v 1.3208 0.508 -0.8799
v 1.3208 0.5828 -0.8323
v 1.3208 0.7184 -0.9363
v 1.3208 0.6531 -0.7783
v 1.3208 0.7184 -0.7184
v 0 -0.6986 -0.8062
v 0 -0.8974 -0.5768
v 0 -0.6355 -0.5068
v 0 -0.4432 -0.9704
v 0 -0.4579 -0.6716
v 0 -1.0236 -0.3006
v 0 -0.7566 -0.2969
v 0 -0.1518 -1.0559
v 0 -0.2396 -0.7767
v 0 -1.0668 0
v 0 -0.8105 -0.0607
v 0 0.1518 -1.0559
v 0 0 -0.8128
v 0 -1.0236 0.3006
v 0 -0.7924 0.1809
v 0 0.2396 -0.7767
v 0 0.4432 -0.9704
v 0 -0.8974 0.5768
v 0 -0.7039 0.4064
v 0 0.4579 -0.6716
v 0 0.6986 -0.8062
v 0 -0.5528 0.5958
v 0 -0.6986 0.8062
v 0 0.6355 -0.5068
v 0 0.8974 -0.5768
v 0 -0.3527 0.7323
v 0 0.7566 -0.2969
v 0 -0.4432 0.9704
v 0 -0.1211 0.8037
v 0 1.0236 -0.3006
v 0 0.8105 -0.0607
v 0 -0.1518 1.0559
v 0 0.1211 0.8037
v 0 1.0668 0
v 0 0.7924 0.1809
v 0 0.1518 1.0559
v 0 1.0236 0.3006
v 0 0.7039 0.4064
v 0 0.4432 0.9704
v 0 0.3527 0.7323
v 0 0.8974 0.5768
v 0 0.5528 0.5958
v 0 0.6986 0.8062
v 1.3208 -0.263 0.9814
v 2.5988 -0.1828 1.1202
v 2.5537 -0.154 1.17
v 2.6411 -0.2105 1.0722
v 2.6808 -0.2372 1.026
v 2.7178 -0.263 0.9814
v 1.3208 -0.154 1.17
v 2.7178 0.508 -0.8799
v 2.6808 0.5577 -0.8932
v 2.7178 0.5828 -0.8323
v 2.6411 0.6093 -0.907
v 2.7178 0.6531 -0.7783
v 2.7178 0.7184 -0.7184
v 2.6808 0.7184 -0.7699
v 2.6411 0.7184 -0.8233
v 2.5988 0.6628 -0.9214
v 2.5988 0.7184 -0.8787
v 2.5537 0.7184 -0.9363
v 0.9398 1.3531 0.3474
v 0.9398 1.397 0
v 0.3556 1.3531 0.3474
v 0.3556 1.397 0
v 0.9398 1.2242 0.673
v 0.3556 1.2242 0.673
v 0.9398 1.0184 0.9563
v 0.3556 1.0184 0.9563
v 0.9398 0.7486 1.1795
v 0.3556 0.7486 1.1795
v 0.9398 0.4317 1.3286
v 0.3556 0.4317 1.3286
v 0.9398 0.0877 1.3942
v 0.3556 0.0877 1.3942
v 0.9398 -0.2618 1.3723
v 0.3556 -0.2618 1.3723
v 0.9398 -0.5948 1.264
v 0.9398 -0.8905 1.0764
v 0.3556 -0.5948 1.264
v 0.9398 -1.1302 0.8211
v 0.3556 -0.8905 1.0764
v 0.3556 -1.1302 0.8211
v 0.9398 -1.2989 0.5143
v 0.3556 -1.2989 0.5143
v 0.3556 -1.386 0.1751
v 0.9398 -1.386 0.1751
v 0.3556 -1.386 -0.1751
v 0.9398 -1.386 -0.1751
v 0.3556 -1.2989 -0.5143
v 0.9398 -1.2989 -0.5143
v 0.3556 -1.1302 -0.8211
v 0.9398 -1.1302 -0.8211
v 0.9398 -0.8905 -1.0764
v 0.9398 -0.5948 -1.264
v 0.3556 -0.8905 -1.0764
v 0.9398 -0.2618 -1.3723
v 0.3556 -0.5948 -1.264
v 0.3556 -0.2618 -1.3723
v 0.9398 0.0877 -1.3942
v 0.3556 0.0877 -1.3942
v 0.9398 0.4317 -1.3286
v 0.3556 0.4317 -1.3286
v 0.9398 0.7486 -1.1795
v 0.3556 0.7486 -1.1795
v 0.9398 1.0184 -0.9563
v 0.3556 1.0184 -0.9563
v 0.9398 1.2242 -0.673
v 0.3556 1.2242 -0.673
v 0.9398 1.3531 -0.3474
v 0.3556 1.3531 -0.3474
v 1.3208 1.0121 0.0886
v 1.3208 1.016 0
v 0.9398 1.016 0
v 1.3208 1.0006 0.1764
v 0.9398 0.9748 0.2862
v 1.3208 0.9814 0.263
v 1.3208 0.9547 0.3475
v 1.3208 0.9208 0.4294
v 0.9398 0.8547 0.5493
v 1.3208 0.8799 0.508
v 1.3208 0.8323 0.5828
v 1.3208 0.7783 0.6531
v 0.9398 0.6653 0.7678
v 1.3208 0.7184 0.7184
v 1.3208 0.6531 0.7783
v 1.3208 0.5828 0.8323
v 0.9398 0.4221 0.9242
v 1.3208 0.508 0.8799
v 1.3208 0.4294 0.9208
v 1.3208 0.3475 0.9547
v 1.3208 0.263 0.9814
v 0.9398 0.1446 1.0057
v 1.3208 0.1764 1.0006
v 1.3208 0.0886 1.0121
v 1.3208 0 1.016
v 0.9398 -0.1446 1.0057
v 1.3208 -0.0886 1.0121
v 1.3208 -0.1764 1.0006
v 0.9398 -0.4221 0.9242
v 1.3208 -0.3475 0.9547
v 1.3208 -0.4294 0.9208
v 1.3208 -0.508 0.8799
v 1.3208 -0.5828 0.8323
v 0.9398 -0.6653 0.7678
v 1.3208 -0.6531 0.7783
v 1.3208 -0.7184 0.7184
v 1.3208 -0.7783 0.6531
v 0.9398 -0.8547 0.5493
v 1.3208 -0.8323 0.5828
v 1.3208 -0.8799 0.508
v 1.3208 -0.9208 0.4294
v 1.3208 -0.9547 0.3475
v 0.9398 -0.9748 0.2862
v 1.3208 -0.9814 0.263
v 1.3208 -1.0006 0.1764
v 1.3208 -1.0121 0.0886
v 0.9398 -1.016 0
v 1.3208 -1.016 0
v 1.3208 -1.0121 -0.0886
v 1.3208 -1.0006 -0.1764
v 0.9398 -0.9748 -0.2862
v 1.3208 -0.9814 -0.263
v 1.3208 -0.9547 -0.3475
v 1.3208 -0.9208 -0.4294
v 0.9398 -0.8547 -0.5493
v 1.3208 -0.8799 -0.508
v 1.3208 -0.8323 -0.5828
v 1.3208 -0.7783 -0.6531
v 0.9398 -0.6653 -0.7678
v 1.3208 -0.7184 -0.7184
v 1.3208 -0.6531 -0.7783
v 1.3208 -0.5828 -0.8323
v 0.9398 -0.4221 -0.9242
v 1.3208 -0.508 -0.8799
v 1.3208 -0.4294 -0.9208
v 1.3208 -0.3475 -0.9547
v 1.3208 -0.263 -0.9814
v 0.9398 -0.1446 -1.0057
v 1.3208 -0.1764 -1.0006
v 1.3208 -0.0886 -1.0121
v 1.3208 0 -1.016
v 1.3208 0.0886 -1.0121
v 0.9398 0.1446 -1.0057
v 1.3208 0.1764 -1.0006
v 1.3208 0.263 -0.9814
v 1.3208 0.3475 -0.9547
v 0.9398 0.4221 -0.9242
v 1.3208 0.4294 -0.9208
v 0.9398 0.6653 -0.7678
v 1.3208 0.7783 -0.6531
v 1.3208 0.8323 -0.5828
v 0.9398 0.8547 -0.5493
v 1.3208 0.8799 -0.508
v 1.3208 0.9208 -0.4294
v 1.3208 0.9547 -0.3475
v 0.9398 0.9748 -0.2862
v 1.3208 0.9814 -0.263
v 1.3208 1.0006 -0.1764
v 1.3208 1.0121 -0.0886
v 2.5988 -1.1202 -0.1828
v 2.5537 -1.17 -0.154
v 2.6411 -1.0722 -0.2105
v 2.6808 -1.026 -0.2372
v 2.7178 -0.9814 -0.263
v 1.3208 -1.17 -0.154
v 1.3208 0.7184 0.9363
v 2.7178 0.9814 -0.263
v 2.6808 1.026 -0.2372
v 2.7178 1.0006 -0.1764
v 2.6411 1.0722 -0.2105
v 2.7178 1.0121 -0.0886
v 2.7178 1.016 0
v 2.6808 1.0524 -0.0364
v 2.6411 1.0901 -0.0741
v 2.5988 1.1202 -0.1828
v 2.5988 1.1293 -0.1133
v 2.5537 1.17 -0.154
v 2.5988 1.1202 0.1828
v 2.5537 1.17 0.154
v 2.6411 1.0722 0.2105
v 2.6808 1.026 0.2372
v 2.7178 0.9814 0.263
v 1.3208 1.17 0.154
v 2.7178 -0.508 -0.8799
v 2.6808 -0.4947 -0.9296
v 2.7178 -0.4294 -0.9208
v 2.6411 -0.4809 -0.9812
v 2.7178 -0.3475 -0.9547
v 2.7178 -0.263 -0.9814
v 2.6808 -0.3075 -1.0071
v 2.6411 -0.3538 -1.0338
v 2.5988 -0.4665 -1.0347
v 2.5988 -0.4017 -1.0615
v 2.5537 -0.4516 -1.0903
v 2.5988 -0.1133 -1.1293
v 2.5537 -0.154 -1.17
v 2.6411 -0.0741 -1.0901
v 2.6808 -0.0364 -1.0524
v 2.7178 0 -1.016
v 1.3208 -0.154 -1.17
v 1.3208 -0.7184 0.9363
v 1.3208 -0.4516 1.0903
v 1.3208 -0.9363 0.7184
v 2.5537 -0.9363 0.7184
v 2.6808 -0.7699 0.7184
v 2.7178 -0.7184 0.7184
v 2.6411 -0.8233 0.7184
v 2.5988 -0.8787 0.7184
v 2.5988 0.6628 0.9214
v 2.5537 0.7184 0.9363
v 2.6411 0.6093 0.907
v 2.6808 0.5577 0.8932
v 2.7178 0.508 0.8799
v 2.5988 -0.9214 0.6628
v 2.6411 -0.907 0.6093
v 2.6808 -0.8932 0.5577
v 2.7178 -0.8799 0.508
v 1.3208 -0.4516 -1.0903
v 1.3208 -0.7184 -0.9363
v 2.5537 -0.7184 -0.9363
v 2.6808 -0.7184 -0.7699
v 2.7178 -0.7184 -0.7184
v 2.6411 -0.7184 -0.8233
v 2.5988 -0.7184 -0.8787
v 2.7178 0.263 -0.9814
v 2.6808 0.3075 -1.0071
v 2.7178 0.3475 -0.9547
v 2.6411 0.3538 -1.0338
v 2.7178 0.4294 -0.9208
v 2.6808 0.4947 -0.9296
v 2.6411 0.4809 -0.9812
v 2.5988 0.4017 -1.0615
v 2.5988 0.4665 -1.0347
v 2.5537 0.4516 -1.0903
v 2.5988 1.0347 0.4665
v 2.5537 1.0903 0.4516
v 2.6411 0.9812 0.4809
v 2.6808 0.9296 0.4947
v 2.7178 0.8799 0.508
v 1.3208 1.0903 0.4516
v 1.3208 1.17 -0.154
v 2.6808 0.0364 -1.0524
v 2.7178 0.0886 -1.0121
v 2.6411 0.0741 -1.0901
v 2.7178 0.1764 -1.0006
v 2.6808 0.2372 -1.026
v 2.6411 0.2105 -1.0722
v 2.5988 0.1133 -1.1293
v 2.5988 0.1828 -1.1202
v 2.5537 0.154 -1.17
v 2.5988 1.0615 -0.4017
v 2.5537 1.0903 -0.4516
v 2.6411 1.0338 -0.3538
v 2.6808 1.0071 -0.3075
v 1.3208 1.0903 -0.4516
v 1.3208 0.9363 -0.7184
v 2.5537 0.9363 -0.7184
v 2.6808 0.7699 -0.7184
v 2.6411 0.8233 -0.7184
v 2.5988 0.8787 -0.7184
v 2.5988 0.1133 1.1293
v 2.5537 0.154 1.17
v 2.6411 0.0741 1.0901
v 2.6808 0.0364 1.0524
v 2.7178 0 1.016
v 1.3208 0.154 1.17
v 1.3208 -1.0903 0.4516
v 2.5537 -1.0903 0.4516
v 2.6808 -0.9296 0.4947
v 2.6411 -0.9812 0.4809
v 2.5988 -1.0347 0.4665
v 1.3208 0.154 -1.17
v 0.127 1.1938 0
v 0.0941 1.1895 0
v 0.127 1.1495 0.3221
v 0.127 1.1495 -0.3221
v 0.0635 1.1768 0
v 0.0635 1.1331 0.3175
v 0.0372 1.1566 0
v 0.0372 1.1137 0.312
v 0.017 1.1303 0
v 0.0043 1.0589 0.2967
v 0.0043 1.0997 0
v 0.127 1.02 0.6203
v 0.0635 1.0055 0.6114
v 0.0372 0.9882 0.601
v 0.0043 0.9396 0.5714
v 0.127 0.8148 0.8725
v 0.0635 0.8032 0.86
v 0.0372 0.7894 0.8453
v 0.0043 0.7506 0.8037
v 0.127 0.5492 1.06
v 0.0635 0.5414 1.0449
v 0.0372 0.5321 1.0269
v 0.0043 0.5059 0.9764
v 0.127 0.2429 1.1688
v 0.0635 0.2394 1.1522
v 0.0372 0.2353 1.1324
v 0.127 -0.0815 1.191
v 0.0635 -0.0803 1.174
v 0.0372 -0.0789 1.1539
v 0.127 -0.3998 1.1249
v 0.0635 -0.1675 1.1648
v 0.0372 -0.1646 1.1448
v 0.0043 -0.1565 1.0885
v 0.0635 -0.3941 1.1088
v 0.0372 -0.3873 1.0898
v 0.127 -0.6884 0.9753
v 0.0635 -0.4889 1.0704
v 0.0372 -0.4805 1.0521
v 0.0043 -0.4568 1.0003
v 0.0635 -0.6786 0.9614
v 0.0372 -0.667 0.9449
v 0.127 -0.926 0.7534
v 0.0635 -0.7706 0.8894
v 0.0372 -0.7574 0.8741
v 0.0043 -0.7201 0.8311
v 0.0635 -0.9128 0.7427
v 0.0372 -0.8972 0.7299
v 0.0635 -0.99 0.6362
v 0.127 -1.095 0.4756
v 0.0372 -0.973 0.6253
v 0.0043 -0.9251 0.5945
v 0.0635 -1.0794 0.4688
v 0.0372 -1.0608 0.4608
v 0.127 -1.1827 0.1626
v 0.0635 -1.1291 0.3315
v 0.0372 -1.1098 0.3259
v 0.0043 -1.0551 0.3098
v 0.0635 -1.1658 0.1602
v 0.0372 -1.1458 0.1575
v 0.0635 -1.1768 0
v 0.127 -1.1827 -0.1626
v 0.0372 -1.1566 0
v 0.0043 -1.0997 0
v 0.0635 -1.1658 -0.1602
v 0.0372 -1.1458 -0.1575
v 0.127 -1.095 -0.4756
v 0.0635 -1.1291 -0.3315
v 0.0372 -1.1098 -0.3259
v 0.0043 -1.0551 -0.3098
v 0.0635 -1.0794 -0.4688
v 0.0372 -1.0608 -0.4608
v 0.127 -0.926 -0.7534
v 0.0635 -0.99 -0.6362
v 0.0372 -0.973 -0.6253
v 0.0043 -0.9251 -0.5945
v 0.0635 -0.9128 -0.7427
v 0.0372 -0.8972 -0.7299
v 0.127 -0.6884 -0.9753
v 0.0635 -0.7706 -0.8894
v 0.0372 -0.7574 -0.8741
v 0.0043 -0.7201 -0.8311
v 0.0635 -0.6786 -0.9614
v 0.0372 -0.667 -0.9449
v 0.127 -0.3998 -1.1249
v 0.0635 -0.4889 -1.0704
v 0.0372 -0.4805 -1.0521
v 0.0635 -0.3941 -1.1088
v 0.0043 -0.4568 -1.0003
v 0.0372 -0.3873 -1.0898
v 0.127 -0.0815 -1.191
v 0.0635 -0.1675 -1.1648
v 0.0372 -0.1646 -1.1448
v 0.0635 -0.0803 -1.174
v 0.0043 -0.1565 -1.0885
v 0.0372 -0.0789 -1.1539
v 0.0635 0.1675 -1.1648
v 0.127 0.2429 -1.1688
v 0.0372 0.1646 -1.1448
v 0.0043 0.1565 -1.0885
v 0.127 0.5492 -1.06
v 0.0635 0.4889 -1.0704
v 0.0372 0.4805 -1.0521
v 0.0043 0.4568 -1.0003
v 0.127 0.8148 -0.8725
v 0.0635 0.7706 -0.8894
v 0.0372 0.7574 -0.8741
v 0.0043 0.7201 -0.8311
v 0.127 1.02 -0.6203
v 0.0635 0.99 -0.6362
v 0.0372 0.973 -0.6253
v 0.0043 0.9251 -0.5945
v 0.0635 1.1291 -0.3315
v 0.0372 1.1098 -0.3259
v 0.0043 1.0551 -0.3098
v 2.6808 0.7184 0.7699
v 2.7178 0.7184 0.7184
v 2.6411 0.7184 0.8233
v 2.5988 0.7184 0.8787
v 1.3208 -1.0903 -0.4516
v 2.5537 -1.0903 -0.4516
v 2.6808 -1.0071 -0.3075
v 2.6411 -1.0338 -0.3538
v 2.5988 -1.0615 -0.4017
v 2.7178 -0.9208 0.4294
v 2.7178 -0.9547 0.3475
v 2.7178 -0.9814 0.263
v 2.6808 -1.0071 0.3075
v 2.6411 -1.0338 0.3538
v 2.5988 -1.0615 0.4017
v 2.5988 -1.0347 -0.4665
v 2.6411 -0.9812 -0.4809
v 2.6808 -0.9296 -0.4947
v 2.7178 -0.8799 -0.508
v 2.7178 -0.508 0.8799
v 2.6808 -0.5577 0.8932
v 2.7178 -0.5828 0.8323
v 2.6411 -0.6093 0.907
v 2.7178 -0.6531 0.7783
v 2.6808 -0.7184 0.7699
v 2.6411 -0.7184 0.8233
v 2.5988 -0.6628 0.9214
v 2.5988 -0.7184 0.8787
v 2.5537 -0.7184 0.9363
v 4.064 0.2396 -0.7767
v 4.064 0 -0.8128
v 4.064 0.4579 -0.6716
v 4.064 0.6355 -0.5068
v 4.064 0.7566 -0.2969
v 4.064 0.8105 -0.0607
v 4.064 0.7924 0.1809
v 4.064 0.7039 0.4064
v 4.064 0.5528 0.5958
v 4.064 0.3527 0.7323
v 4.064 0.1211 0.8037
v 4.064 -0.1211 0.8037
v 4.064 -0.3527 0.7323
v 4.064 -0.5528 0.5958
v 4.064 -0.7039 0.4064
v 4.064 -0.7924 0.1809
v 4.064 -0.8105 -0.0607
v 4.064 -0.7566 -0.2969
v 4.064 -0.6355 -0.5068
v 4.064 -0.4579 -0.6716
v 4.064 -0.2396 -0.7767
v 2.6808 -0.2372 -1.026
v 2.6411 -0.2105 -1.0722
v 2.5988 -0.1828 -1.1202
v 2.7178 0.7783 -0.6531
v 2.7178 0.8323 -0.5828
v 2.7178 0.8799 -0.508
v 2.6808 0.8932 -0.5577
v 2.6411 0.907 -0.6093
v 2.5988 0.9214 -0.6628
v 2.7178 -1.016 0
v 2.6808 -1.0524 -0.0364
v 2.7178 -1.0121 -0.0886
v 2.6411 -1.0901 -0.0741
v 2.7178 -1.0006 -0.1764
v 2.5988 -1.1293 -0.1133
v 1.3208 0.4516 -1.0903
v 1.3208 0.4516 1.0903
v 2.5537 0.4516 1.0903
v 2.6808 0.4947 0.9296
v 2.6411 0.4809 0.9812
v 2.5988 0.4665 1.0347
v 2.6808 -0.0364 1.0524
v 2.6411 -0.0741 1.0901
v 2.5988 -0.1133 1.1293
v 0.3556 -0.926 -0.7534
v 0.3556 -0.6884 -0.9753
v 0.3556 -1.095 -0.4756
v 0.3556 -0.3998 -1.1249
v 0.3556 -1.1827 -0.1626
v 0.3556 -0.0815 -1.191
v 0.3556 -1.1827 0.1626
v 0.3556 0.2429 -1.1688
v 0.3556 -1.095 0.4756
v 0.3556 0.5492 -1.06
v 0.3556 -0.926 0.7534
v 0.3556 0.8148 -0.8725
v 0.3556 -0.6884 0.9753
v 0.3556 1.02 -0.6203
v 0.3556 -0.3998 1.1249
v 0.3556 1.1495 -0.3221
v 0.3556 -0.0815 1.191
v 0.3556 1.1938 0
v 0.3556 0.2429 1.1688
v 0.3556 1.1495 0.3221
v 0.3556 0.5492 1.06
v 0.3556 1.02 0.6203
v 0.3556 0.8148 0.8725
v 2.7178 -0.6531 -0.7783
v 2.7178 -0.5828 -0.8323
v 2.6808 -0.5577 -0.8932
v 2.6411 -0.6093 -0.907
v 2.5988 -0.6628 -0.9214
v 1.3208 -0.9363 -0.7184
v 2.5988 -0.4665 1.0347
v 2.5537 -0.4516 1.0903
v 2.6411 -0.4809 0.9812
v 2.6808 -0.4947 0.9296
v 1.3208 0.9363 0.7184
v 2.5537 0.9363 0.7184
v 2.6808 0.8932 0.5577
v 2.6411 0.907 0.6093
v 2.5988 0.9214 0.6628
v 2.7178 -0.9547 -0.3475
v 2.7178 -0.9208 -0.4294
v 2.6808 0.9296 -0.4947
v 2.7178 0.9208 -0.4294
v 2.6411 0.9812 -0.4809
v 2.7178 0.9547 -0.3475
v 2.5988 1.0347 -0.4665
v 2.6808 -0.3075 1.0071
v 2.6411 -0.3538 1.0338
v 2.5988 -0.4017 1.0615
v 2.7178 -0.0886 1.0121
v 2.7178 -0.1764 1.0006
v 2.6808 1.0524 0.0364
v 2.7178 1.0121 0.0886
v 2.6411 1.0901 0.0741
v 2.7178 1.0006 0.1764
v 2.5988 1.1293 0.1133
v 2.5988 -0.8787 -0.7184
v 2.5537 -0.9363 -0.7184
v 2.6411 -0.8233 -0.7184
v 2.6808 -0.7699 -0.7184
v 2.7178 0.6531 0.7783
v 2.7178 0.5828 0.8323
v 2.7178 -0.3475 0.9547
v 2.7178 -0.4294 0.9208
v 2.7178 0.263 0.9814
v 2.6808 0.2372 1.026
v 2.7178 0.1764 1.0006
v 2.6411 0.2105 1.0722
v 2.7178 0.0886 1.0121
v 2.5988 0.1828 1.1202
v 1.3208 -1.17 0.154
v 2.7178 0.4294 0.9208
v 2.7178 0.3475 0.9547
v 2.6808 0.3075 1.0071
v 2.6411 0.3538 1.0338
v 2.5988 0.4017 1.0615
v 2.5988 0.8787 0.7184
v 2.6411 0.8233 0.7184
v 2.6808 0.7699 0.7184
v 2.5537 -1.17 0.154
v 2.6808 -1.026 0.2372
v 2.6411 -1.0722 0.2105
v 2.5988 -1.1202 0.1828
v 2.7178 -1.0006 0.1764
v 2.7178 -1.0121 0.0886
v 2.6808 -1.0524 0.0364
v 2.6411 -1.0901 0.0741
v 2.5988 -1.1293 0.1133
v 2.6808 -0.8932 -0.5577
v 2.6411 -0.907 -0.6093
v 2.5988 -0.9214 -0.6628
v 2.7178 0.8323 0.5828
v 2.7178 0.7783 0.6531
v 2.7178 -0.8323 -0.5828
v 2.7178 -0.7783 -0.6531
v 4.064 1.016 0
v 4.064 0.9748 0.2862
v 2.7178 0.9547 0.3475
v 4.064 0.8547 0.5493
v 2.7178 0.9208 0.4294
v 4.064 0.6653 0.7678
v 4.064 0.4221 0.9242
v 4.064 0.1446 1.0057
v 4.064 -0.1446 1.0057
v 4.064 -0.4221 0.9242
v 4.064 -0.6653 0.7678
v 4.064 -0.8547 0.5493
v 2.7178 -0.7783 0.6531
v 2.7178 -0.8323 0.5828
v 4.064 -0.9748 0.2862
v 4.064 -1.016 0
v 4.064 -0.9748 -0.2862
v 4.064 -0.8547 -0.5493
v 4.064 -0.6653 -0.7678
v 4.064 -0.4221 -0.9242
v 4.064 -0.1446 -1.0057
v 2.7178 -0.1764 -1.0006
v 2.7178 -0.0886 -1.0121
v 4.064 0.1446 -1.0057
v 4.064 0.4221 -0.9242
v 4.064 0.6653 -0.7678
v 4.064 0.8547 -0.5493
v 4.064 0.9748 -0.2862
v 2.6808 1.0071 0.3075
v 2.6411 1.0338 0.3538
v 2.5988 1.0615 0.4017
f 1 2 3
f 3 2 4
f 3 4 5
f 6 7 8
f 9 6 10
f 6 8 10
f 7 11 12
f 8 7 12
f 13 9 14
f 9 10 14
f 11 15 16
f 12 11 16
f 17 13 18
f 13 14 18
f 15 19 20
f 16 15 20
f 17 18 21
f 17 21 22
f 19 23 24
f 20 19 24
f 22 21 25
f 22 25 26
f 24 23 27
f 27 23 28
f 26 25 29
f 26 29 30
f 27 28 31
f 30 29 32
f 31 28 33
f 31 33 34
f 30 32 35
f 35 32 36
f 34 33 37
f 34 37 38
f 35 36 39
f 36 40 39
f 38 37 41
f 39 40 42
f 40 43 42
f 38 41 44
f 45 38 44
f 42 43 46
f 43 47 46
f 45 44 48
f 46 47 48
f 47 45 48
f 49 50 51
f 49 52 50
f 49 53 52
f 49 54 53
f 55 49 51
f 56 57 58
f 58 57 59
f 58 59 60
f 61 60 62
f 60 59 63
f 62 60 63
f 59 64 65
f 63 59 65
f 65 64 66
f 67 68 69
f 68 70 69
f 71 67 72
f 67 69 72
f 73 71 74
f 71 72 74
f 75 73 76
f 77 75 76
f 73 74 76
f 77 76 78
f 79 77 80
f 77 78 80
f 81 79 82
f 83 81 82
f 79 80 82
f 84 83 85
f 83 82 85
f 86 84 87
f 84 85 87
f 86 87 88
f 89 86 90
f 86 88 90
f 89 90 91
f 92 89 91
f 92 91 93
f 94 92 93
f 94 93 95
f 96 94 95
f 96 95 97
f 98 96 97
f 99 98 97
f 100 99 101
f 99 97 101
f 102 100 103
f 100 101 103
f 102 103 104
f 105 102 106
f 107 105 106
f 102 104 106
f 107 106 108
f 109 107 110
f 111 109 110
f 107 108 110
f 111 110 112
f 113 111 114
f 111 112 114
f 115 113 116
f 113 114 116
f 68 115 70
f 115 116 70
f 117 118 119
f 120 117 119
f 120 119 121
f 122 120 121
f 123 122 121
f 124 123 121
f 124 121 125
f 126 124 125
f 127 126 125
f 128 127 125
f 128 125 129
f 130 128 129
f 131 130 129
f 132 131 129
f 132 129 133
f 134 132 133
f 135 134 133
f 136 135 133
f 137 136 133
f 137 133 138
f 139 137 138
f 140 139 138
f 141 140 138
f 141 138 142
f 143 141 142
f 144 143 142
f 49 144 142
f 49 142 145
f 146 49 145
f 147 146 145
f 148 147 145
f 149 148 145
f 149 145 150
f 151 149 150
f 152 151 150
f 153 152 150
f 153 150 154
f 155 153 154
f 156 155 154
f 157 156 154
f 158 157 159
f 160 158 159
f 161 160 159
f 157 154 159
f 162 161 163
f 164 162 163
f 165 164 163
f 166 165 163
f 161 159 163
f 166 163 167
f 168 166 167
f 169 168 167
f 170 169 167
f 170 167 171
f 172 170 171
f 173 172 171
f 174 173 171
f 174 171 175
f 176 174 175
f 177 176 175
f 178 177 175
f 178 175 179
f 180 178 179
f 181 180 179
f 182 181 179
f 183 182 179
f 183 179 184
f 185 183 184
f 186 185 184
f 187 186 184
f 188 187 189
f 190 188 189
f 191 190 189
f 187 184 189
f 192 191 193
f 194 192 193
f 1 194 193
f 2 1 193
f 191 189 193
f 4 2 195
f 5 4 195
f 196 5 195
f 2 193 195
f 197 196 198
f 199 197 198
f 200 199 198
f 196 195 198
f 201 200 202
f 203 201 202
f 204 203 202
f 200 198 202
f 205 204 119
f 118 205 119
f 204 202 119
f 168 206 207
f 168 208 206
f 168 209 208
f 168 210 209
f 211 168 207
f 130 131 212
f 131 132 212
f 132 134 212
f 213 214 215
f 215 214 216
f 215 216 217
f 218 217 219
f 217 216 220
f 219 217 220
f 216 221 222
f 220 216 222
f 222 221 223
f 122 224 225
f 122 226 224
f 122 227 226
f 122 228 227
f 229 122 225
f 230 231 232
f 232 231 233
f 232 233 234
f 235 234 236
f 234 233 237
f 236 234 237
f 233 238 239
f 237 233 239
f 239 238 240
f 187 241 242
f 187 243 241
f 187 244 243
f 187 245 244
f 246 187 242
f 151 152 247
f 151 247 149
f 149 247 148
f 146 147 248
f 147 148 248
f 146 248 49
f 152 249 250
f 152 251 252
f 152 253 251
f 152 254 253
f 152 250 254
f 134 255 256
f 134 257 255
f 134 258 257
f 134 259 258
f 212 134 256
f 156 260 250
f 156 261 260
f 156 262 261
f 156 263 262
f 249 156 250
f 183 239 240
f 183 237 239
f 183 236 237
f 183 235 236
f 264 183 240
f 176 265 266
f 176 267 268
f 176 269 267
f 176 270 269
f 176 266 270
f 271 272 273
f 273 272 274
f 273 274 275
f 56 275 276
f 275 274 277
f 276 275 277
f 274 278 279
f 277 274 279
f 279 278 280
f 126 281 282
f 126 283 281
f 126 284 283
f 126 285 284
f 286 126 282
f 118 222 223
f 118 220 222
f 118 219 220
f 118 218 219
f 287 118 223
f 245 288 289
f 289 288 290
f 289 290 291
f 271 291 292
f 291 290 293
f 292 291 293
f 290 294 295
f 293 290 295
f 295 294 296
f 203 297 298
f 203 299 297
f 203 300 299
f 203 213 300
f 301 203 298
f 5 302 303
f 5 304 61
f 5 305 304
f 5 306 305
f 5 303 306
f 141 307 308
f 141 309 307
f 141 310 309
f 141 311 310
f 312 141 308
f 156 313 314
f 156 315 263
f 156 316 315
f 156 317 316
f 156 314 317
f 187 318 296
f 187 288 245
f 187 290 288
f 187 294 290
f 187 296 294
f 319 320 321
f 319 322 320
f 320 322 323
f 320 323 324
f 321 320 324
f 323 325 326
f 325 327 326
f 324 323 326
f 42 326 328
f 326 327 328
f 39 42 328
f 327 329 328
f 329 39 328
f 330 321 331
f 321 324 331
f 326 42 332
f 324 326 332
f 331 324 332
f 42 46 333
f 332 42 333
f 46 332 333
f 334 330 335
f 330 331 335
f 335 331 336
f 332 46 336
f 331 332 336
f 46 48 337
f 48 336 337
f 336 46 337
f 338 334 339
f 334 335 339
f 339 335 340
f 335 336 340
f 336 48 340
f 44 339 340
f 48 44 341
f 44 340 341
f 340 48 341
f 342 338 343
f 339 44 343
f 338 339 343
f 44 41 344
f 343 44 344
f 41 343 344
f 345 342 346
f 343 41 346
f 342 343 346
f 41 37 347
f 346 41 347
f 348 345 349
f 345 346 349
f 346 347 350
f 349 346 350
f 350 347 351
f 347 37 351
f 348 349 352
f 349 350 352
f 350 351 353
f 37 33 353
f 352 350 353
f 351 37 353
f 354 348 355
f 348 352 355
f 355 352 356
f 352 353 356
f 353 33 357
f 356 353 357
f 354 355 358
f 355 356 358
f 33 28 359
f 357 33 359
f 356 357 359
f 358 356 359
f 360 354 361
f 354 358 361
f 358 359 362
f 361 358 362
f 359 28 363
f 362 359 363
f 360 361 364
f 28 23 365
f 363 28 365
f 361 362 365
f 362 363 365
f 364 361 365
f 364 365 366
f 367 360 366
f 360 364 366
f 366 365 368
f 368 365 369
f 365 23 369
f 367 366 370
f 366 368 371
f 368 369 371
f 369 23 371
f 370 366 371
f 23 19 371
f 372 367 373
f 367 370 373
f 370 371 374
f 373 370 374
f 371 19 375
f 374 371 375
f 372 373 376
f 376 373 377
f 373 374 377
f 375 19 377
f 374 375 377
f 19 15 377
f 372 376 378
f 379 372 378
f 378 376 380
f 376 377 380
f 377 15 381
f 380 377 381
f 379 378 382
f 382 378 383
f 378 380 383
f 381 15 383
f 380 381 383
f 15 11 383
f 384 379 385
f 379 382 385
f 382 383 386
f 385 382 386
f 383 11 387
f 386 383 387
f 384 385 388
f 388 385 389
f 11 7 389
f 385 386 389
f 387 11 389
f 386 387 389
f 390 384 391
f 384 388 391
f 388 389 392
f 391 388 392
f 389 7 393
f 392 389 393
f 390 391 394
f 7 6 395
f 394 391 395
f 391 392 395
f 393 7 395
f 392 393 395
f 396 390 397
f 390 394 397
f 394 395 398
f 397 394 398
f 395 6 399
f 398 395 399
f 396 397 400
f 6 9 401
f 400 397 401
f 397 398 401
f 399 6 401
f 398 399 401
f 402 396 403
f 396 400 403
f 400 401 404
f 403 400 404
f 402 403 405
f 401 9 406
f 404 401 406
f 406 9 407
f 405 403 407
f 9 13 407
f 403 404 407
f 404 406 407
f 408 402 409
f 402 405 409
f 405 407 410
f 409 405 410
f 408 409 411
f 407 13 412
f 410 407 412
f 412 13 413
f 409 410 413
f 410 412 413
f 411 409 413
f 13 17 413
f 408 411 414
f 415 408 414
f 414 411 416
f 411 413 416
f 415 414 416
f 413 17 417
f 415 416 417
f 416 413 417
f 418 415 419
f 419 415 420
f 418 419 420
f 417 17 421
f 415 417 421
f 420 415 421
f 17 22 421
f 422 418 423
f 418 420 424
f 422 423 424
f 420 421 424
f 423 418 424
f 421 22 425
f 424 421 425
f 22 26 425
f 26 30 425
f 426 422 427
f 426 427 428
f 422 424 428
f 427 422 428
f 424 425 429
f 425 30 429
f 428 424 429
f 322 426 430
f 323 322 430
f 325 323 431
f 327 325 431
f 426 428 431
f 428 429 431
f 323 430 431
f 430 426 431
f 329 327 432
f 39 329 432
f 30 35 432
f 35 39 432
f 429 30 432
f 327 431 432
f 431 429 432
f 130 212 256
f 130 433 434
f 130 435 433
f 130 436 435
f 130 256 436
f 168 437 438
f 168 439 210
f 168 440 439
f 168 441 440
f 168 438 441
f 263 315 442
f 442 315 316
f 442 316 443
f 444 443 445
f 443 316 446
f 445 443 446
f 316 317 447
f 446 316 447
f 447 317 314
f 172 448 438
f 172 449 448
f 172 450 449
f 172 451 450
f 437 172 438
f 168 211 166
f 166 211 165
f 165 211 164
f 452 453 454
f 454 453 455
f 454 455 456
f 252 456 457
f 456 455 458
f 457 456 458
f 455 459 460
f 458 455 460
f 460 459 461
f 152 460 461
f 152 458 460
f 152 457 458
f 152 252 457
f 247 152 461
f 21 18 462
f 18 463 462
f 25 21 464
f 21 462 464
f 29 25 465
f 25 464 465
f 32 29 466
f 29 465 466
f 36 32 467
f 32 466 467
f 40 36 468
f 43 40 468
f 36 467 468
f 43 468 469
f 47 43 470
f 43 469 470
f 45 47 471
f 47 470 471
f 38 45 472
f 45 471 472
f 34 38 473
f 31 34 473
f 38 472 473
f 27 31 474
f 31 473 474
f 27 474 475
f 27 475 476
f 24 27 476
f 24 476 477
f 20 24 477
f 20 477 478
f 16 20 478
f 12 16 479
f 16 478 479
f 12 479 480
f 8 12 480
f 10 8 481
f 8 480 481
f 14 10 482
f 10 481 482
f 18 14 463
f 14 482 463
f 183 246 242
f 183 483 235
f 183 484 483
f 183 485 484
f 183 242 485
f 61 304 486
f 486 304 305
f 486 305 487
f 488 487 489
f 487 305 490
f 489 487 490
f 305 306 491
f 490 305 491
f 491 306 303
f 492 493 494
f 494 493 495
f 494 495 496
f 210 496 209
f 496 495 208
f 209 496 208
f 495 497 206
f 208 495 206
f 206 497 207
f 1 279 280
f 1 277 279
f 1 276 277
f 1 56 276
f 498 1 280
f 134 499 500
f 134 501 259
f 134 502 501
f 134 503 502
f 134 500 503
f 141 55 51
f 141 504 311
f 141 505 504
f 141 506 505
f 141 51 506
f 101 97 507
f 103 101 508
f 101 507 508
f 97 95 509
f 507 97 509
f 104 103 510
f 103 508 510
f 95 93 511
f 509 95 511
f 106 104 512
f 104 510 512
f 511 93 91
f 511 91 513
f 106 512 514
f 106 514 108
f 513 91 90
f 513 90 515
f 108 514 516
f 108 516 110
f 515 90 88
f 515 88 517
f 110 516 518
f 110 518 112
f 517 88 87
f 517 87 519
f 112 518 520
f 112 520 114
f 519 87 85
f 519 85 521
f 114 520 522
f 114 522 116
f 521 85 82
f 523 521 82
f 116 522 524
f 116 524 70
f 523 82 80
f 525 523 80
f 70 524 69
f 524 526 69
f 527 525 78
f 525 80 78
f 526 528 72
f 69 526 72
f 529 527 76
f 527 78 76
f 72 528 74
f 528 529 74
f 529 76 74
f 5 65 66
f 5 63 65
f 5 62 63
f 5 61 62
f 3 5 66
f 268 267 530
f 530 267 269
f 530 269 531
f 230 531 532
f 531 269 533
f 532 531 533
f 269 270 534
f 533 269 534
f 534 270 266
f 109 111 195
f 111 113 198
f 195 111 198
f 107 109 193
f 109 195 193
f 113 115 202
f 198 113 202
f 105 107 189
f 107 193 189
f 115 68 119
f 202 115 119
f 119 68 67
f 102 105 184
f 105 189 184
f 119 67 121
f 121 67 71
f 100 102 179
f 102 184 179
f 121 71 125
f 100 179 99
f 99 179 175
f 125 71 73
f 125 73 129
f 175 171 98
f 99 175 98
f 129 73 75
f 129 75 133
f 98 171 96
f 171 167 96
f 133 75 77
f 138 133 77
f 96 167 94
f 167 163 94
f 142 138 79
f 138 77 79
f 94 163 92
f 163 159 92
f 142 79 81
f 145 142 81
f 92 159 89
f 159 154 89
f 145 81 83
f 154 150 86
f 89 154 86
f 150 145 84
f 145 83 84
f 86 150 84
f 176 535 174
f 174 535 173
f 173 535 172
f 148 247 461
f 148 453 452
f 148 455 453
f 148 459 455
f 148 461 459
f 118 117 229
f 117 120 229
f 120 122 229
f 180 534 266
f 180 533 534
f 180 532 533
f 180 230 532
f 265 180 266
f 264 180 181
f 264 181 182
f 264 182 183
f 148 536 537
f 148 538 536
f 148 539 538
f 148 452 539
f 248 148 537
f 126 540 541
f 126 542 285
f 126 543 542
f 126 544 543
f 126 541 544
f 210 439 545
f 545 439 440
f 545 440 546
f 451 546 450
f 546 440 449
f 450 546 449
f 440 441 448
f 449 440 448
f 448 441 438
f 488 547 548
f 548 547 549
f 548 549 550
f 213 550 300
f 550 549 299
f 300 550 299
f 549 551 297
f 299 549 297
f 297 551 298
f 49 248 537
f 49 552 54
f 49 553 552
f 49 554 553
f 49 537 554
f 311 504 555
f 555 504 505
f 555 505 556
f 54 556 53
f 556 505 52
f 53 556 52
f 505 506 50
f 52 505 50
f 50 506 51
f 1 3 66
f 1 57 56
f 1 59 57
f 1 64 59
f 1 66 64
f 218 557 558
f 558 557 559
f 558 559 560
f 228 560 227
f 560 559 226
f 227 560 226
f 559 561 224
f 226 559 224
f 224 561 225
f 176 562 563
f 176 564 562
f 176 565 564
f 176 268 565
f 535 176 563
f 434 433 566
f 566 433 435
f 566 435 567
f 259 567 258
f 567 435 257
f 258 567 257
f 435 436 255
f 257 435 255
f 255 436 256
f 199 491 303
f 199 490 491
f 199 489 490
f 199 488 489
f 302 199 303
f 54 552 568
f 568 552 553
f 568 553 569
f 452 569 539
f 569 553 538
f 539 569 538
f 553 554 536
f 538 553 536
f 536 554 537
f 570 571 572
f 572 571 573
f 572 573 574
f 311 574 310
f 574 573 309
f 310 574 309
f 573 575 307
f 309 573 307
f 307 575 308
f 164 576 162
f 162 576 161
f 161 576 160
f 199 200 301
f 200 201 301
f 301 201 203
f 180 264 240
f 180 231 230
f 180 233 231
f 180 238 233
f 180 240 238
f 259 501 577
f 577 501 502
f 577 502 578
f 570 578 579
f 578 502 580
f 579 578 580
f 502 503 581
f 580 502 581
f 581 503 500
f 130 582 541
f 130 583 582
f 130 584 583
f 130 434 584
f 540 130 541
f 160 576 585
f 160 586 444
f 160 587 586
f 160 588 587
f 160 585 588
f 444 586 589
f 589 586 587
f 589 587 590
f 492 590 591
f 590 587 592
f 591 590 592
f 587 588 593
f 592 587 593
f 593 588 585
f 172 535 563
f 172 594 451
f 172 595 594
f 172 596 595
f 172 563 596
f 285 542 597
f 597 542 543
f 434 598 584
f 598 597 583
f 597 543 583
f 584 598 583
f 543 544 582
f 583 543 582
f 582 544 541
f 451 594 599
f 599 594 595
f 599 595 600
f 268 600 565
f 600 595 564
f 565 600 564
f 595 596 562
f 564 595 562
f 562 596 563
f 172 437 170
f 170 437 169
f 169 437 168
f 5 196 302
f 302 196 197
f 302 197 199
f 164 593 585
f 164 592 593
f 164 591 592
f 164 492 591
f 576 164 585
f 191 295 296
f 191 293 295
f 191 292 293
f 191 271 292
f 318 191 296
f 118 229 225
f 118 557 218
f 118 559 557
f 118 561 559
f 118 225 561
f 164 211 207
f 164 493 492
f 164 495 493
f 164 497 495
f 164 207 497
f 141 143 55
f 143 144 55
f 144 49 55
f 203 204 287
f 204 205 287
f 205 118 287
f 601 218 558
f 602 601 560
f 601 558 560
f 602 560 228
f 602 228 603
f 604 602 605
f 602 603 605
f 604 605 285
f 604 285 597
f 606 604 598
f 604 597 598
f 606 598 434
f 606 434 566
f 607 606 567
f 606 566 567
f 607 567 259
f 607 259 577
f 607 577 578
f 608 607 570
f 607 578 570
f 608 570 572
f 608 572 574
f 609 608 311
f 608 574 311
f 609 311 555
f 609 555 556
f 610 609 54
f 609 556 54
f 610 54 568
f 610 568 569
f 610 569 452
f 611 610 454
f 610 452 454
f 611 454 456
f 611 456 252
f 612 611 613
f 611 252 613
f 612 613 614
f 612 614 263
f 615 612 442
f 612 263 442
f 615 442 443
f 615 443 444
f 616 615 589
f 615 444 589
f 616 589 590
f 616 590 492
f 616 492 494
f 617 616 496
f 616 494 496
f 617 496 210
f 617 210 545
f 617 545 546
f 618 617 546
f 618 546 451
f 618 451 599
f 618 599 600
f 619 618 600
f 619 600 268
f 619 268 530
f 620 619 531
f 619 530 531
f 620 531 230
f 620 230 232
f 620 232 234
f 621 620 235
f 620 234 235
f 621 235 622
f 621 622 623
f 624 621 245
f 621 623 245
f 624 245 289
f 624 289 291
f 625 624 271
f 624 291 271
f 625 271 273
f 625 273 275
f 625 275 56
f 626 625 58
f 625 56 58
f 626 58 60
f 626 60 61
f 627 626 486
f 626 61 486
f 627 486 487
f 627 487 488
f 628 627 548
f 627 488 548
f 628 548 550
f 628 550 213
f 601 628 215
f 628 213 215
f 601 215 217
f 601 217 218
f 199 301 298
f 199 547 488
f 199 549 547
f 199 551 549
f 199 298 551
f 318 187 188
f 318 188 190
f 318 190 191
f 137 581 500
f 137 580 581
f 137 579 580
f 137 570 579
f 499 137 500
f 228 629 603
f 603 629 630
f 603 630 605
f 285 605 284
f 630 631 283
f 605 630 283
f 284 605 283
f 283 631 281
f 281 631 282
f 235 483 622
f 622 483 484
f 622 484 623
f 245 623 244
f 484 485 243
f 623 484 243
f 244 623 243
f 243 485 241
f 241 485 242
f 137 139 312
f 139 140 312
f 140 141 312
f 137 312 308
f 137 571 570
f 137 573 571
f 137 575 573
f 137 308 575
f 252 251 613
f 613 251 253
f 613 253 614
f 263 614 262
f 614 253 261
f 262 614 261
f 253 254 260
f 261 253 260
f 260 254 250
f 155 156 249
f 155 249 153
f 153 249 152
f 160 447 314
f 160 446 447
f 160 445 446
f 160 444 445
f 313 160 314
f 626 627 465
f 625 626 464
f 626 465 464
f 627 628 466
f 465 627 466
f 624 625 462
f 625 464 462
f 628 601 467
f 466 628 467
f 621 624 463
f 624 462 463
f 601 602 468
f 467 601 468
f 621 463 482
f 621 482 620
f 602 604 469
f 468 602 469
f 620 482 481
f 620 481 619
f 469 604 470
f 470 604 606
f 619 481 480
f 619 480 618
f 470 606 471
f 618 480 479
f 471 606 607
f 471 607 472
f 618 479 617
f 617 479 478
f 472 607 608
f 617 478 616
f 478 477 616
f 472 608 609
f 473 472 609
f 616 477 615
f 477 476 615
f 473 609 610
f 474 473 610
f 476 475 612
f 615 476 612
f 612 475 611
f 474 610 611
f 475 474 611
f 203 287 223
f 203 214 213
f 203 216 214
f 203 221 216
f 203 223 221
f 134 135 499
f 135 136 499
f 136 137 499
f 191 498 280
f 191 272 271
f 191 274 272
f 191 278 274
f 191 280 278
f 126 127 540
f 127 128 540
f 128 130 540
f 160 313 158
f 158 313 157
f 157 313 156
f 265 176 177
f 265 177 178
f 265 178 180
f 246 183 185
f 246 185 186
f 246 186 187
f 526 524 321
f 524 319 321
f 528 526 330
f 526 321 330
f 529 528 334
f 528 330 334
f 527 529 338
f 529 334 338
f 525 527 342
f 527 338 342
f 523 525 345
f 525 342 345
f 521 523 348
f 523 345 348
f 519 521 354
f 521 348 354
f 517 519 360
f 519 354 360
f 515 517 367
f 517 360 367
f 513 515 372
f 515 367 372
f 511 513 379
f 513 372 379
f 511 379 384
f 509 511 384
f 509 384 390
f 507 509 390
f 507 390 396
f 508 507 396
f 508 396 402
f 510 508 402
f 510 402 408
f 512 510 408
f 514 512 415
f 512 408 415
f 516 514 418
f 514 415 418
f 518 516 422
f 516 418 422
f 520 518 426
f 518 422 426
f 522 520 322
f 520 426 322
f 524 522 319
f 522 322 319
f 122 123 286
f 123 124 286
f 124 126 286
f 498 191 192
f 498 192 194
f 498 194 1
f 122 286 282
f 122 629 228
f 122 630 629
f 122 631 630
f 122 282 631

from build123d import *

# Parameters (mm, degrees)
HOLE1_D               = 1.6256
HOLE1_DEPTH           = 4.064
HOLE1_TIP             = 0.488379511
EXTRUSIONBLIND1_DEPTH = 1.397
POLAR_PATTERN1_COUNT  = 24


with BuildPart() as part:
    # Sketch1 → RevolutionAngle1 (revolve)
    with BuildSketch(Plane.XY):
        with BuildLine():
            Line((4.064, 0), (4.064, 1.016))
            Line((4.064, 1.016), (2.7178, 1.016))
            Line((2.7178, 1.016), (2.5527, 1.1811))
            Line((2.5527, 1.1811), (1.3208, 1.1811))
            Line((1.3208, 1.1811), (1.3208, 1.016))
            Line((1.3208, 1.016), (0.9398, 1.016))
            Line((0.9398, 1.016), (0.9398, 1.397))
            Line((0.9398, 1.397), (0.3556, 1.397))
            Line((0.3556, 1.397), (0.3556, 1.1938))
            Line((0.3556, 1.1938), (0.127, 1.1938))
            ThreePointArc((0.127, 1.1938), (0.037197439, 1.156602561), (0, 1.0668))
            Line((0, 1.0668), (0, 0))
            Line((0, 0), (4.064, 0))
        make_face()
    revolve(axis=Axis((0, 0, 0), (1, 0, 0)))

    # Hole1
    with Locations(Plane.ZY):
        with Locations((0, 0)):
            Hole(HOLE1_D / 2, depth=HOLE1_DEPTH)
            with Locations((0, 0, -(HOLE1_DEPTH + HOLE1_TIP / 2))):  # 118° drill point
                Cone(0, HOLE1_D / 2, HOLE1_TIP, mode=Mode.SUBTRACT)

    # Sketch4 → ExtrusionBlind1 (cut)
    with BuildSketch(Plane.ZY.offset(-1.3208)):
        Polygon((-1.016, 0), (-1.1811, -0.1651), (-1.1811, 0.1651), align=None)
    extrusionblind1 = extrude(amount=-EXTRUSIONBLIND1_DEPTH, mode=Mode.SUBTRACT)

    # Polar Pattern1: ExtrusionBlind1 ×24 about axis
    polar_pattern1_axis = Axis((0, 0, 0), (1, 0, 0))
    for i in range(1, POLAR_PATTERN1_COUNT):
        add(extrusionblind1.rotate(polar_pattern1_axis, i * 360 / POLAR_PATTERN1_COUNT), mode=Mode.SUBTRACT)


solid = part.part
